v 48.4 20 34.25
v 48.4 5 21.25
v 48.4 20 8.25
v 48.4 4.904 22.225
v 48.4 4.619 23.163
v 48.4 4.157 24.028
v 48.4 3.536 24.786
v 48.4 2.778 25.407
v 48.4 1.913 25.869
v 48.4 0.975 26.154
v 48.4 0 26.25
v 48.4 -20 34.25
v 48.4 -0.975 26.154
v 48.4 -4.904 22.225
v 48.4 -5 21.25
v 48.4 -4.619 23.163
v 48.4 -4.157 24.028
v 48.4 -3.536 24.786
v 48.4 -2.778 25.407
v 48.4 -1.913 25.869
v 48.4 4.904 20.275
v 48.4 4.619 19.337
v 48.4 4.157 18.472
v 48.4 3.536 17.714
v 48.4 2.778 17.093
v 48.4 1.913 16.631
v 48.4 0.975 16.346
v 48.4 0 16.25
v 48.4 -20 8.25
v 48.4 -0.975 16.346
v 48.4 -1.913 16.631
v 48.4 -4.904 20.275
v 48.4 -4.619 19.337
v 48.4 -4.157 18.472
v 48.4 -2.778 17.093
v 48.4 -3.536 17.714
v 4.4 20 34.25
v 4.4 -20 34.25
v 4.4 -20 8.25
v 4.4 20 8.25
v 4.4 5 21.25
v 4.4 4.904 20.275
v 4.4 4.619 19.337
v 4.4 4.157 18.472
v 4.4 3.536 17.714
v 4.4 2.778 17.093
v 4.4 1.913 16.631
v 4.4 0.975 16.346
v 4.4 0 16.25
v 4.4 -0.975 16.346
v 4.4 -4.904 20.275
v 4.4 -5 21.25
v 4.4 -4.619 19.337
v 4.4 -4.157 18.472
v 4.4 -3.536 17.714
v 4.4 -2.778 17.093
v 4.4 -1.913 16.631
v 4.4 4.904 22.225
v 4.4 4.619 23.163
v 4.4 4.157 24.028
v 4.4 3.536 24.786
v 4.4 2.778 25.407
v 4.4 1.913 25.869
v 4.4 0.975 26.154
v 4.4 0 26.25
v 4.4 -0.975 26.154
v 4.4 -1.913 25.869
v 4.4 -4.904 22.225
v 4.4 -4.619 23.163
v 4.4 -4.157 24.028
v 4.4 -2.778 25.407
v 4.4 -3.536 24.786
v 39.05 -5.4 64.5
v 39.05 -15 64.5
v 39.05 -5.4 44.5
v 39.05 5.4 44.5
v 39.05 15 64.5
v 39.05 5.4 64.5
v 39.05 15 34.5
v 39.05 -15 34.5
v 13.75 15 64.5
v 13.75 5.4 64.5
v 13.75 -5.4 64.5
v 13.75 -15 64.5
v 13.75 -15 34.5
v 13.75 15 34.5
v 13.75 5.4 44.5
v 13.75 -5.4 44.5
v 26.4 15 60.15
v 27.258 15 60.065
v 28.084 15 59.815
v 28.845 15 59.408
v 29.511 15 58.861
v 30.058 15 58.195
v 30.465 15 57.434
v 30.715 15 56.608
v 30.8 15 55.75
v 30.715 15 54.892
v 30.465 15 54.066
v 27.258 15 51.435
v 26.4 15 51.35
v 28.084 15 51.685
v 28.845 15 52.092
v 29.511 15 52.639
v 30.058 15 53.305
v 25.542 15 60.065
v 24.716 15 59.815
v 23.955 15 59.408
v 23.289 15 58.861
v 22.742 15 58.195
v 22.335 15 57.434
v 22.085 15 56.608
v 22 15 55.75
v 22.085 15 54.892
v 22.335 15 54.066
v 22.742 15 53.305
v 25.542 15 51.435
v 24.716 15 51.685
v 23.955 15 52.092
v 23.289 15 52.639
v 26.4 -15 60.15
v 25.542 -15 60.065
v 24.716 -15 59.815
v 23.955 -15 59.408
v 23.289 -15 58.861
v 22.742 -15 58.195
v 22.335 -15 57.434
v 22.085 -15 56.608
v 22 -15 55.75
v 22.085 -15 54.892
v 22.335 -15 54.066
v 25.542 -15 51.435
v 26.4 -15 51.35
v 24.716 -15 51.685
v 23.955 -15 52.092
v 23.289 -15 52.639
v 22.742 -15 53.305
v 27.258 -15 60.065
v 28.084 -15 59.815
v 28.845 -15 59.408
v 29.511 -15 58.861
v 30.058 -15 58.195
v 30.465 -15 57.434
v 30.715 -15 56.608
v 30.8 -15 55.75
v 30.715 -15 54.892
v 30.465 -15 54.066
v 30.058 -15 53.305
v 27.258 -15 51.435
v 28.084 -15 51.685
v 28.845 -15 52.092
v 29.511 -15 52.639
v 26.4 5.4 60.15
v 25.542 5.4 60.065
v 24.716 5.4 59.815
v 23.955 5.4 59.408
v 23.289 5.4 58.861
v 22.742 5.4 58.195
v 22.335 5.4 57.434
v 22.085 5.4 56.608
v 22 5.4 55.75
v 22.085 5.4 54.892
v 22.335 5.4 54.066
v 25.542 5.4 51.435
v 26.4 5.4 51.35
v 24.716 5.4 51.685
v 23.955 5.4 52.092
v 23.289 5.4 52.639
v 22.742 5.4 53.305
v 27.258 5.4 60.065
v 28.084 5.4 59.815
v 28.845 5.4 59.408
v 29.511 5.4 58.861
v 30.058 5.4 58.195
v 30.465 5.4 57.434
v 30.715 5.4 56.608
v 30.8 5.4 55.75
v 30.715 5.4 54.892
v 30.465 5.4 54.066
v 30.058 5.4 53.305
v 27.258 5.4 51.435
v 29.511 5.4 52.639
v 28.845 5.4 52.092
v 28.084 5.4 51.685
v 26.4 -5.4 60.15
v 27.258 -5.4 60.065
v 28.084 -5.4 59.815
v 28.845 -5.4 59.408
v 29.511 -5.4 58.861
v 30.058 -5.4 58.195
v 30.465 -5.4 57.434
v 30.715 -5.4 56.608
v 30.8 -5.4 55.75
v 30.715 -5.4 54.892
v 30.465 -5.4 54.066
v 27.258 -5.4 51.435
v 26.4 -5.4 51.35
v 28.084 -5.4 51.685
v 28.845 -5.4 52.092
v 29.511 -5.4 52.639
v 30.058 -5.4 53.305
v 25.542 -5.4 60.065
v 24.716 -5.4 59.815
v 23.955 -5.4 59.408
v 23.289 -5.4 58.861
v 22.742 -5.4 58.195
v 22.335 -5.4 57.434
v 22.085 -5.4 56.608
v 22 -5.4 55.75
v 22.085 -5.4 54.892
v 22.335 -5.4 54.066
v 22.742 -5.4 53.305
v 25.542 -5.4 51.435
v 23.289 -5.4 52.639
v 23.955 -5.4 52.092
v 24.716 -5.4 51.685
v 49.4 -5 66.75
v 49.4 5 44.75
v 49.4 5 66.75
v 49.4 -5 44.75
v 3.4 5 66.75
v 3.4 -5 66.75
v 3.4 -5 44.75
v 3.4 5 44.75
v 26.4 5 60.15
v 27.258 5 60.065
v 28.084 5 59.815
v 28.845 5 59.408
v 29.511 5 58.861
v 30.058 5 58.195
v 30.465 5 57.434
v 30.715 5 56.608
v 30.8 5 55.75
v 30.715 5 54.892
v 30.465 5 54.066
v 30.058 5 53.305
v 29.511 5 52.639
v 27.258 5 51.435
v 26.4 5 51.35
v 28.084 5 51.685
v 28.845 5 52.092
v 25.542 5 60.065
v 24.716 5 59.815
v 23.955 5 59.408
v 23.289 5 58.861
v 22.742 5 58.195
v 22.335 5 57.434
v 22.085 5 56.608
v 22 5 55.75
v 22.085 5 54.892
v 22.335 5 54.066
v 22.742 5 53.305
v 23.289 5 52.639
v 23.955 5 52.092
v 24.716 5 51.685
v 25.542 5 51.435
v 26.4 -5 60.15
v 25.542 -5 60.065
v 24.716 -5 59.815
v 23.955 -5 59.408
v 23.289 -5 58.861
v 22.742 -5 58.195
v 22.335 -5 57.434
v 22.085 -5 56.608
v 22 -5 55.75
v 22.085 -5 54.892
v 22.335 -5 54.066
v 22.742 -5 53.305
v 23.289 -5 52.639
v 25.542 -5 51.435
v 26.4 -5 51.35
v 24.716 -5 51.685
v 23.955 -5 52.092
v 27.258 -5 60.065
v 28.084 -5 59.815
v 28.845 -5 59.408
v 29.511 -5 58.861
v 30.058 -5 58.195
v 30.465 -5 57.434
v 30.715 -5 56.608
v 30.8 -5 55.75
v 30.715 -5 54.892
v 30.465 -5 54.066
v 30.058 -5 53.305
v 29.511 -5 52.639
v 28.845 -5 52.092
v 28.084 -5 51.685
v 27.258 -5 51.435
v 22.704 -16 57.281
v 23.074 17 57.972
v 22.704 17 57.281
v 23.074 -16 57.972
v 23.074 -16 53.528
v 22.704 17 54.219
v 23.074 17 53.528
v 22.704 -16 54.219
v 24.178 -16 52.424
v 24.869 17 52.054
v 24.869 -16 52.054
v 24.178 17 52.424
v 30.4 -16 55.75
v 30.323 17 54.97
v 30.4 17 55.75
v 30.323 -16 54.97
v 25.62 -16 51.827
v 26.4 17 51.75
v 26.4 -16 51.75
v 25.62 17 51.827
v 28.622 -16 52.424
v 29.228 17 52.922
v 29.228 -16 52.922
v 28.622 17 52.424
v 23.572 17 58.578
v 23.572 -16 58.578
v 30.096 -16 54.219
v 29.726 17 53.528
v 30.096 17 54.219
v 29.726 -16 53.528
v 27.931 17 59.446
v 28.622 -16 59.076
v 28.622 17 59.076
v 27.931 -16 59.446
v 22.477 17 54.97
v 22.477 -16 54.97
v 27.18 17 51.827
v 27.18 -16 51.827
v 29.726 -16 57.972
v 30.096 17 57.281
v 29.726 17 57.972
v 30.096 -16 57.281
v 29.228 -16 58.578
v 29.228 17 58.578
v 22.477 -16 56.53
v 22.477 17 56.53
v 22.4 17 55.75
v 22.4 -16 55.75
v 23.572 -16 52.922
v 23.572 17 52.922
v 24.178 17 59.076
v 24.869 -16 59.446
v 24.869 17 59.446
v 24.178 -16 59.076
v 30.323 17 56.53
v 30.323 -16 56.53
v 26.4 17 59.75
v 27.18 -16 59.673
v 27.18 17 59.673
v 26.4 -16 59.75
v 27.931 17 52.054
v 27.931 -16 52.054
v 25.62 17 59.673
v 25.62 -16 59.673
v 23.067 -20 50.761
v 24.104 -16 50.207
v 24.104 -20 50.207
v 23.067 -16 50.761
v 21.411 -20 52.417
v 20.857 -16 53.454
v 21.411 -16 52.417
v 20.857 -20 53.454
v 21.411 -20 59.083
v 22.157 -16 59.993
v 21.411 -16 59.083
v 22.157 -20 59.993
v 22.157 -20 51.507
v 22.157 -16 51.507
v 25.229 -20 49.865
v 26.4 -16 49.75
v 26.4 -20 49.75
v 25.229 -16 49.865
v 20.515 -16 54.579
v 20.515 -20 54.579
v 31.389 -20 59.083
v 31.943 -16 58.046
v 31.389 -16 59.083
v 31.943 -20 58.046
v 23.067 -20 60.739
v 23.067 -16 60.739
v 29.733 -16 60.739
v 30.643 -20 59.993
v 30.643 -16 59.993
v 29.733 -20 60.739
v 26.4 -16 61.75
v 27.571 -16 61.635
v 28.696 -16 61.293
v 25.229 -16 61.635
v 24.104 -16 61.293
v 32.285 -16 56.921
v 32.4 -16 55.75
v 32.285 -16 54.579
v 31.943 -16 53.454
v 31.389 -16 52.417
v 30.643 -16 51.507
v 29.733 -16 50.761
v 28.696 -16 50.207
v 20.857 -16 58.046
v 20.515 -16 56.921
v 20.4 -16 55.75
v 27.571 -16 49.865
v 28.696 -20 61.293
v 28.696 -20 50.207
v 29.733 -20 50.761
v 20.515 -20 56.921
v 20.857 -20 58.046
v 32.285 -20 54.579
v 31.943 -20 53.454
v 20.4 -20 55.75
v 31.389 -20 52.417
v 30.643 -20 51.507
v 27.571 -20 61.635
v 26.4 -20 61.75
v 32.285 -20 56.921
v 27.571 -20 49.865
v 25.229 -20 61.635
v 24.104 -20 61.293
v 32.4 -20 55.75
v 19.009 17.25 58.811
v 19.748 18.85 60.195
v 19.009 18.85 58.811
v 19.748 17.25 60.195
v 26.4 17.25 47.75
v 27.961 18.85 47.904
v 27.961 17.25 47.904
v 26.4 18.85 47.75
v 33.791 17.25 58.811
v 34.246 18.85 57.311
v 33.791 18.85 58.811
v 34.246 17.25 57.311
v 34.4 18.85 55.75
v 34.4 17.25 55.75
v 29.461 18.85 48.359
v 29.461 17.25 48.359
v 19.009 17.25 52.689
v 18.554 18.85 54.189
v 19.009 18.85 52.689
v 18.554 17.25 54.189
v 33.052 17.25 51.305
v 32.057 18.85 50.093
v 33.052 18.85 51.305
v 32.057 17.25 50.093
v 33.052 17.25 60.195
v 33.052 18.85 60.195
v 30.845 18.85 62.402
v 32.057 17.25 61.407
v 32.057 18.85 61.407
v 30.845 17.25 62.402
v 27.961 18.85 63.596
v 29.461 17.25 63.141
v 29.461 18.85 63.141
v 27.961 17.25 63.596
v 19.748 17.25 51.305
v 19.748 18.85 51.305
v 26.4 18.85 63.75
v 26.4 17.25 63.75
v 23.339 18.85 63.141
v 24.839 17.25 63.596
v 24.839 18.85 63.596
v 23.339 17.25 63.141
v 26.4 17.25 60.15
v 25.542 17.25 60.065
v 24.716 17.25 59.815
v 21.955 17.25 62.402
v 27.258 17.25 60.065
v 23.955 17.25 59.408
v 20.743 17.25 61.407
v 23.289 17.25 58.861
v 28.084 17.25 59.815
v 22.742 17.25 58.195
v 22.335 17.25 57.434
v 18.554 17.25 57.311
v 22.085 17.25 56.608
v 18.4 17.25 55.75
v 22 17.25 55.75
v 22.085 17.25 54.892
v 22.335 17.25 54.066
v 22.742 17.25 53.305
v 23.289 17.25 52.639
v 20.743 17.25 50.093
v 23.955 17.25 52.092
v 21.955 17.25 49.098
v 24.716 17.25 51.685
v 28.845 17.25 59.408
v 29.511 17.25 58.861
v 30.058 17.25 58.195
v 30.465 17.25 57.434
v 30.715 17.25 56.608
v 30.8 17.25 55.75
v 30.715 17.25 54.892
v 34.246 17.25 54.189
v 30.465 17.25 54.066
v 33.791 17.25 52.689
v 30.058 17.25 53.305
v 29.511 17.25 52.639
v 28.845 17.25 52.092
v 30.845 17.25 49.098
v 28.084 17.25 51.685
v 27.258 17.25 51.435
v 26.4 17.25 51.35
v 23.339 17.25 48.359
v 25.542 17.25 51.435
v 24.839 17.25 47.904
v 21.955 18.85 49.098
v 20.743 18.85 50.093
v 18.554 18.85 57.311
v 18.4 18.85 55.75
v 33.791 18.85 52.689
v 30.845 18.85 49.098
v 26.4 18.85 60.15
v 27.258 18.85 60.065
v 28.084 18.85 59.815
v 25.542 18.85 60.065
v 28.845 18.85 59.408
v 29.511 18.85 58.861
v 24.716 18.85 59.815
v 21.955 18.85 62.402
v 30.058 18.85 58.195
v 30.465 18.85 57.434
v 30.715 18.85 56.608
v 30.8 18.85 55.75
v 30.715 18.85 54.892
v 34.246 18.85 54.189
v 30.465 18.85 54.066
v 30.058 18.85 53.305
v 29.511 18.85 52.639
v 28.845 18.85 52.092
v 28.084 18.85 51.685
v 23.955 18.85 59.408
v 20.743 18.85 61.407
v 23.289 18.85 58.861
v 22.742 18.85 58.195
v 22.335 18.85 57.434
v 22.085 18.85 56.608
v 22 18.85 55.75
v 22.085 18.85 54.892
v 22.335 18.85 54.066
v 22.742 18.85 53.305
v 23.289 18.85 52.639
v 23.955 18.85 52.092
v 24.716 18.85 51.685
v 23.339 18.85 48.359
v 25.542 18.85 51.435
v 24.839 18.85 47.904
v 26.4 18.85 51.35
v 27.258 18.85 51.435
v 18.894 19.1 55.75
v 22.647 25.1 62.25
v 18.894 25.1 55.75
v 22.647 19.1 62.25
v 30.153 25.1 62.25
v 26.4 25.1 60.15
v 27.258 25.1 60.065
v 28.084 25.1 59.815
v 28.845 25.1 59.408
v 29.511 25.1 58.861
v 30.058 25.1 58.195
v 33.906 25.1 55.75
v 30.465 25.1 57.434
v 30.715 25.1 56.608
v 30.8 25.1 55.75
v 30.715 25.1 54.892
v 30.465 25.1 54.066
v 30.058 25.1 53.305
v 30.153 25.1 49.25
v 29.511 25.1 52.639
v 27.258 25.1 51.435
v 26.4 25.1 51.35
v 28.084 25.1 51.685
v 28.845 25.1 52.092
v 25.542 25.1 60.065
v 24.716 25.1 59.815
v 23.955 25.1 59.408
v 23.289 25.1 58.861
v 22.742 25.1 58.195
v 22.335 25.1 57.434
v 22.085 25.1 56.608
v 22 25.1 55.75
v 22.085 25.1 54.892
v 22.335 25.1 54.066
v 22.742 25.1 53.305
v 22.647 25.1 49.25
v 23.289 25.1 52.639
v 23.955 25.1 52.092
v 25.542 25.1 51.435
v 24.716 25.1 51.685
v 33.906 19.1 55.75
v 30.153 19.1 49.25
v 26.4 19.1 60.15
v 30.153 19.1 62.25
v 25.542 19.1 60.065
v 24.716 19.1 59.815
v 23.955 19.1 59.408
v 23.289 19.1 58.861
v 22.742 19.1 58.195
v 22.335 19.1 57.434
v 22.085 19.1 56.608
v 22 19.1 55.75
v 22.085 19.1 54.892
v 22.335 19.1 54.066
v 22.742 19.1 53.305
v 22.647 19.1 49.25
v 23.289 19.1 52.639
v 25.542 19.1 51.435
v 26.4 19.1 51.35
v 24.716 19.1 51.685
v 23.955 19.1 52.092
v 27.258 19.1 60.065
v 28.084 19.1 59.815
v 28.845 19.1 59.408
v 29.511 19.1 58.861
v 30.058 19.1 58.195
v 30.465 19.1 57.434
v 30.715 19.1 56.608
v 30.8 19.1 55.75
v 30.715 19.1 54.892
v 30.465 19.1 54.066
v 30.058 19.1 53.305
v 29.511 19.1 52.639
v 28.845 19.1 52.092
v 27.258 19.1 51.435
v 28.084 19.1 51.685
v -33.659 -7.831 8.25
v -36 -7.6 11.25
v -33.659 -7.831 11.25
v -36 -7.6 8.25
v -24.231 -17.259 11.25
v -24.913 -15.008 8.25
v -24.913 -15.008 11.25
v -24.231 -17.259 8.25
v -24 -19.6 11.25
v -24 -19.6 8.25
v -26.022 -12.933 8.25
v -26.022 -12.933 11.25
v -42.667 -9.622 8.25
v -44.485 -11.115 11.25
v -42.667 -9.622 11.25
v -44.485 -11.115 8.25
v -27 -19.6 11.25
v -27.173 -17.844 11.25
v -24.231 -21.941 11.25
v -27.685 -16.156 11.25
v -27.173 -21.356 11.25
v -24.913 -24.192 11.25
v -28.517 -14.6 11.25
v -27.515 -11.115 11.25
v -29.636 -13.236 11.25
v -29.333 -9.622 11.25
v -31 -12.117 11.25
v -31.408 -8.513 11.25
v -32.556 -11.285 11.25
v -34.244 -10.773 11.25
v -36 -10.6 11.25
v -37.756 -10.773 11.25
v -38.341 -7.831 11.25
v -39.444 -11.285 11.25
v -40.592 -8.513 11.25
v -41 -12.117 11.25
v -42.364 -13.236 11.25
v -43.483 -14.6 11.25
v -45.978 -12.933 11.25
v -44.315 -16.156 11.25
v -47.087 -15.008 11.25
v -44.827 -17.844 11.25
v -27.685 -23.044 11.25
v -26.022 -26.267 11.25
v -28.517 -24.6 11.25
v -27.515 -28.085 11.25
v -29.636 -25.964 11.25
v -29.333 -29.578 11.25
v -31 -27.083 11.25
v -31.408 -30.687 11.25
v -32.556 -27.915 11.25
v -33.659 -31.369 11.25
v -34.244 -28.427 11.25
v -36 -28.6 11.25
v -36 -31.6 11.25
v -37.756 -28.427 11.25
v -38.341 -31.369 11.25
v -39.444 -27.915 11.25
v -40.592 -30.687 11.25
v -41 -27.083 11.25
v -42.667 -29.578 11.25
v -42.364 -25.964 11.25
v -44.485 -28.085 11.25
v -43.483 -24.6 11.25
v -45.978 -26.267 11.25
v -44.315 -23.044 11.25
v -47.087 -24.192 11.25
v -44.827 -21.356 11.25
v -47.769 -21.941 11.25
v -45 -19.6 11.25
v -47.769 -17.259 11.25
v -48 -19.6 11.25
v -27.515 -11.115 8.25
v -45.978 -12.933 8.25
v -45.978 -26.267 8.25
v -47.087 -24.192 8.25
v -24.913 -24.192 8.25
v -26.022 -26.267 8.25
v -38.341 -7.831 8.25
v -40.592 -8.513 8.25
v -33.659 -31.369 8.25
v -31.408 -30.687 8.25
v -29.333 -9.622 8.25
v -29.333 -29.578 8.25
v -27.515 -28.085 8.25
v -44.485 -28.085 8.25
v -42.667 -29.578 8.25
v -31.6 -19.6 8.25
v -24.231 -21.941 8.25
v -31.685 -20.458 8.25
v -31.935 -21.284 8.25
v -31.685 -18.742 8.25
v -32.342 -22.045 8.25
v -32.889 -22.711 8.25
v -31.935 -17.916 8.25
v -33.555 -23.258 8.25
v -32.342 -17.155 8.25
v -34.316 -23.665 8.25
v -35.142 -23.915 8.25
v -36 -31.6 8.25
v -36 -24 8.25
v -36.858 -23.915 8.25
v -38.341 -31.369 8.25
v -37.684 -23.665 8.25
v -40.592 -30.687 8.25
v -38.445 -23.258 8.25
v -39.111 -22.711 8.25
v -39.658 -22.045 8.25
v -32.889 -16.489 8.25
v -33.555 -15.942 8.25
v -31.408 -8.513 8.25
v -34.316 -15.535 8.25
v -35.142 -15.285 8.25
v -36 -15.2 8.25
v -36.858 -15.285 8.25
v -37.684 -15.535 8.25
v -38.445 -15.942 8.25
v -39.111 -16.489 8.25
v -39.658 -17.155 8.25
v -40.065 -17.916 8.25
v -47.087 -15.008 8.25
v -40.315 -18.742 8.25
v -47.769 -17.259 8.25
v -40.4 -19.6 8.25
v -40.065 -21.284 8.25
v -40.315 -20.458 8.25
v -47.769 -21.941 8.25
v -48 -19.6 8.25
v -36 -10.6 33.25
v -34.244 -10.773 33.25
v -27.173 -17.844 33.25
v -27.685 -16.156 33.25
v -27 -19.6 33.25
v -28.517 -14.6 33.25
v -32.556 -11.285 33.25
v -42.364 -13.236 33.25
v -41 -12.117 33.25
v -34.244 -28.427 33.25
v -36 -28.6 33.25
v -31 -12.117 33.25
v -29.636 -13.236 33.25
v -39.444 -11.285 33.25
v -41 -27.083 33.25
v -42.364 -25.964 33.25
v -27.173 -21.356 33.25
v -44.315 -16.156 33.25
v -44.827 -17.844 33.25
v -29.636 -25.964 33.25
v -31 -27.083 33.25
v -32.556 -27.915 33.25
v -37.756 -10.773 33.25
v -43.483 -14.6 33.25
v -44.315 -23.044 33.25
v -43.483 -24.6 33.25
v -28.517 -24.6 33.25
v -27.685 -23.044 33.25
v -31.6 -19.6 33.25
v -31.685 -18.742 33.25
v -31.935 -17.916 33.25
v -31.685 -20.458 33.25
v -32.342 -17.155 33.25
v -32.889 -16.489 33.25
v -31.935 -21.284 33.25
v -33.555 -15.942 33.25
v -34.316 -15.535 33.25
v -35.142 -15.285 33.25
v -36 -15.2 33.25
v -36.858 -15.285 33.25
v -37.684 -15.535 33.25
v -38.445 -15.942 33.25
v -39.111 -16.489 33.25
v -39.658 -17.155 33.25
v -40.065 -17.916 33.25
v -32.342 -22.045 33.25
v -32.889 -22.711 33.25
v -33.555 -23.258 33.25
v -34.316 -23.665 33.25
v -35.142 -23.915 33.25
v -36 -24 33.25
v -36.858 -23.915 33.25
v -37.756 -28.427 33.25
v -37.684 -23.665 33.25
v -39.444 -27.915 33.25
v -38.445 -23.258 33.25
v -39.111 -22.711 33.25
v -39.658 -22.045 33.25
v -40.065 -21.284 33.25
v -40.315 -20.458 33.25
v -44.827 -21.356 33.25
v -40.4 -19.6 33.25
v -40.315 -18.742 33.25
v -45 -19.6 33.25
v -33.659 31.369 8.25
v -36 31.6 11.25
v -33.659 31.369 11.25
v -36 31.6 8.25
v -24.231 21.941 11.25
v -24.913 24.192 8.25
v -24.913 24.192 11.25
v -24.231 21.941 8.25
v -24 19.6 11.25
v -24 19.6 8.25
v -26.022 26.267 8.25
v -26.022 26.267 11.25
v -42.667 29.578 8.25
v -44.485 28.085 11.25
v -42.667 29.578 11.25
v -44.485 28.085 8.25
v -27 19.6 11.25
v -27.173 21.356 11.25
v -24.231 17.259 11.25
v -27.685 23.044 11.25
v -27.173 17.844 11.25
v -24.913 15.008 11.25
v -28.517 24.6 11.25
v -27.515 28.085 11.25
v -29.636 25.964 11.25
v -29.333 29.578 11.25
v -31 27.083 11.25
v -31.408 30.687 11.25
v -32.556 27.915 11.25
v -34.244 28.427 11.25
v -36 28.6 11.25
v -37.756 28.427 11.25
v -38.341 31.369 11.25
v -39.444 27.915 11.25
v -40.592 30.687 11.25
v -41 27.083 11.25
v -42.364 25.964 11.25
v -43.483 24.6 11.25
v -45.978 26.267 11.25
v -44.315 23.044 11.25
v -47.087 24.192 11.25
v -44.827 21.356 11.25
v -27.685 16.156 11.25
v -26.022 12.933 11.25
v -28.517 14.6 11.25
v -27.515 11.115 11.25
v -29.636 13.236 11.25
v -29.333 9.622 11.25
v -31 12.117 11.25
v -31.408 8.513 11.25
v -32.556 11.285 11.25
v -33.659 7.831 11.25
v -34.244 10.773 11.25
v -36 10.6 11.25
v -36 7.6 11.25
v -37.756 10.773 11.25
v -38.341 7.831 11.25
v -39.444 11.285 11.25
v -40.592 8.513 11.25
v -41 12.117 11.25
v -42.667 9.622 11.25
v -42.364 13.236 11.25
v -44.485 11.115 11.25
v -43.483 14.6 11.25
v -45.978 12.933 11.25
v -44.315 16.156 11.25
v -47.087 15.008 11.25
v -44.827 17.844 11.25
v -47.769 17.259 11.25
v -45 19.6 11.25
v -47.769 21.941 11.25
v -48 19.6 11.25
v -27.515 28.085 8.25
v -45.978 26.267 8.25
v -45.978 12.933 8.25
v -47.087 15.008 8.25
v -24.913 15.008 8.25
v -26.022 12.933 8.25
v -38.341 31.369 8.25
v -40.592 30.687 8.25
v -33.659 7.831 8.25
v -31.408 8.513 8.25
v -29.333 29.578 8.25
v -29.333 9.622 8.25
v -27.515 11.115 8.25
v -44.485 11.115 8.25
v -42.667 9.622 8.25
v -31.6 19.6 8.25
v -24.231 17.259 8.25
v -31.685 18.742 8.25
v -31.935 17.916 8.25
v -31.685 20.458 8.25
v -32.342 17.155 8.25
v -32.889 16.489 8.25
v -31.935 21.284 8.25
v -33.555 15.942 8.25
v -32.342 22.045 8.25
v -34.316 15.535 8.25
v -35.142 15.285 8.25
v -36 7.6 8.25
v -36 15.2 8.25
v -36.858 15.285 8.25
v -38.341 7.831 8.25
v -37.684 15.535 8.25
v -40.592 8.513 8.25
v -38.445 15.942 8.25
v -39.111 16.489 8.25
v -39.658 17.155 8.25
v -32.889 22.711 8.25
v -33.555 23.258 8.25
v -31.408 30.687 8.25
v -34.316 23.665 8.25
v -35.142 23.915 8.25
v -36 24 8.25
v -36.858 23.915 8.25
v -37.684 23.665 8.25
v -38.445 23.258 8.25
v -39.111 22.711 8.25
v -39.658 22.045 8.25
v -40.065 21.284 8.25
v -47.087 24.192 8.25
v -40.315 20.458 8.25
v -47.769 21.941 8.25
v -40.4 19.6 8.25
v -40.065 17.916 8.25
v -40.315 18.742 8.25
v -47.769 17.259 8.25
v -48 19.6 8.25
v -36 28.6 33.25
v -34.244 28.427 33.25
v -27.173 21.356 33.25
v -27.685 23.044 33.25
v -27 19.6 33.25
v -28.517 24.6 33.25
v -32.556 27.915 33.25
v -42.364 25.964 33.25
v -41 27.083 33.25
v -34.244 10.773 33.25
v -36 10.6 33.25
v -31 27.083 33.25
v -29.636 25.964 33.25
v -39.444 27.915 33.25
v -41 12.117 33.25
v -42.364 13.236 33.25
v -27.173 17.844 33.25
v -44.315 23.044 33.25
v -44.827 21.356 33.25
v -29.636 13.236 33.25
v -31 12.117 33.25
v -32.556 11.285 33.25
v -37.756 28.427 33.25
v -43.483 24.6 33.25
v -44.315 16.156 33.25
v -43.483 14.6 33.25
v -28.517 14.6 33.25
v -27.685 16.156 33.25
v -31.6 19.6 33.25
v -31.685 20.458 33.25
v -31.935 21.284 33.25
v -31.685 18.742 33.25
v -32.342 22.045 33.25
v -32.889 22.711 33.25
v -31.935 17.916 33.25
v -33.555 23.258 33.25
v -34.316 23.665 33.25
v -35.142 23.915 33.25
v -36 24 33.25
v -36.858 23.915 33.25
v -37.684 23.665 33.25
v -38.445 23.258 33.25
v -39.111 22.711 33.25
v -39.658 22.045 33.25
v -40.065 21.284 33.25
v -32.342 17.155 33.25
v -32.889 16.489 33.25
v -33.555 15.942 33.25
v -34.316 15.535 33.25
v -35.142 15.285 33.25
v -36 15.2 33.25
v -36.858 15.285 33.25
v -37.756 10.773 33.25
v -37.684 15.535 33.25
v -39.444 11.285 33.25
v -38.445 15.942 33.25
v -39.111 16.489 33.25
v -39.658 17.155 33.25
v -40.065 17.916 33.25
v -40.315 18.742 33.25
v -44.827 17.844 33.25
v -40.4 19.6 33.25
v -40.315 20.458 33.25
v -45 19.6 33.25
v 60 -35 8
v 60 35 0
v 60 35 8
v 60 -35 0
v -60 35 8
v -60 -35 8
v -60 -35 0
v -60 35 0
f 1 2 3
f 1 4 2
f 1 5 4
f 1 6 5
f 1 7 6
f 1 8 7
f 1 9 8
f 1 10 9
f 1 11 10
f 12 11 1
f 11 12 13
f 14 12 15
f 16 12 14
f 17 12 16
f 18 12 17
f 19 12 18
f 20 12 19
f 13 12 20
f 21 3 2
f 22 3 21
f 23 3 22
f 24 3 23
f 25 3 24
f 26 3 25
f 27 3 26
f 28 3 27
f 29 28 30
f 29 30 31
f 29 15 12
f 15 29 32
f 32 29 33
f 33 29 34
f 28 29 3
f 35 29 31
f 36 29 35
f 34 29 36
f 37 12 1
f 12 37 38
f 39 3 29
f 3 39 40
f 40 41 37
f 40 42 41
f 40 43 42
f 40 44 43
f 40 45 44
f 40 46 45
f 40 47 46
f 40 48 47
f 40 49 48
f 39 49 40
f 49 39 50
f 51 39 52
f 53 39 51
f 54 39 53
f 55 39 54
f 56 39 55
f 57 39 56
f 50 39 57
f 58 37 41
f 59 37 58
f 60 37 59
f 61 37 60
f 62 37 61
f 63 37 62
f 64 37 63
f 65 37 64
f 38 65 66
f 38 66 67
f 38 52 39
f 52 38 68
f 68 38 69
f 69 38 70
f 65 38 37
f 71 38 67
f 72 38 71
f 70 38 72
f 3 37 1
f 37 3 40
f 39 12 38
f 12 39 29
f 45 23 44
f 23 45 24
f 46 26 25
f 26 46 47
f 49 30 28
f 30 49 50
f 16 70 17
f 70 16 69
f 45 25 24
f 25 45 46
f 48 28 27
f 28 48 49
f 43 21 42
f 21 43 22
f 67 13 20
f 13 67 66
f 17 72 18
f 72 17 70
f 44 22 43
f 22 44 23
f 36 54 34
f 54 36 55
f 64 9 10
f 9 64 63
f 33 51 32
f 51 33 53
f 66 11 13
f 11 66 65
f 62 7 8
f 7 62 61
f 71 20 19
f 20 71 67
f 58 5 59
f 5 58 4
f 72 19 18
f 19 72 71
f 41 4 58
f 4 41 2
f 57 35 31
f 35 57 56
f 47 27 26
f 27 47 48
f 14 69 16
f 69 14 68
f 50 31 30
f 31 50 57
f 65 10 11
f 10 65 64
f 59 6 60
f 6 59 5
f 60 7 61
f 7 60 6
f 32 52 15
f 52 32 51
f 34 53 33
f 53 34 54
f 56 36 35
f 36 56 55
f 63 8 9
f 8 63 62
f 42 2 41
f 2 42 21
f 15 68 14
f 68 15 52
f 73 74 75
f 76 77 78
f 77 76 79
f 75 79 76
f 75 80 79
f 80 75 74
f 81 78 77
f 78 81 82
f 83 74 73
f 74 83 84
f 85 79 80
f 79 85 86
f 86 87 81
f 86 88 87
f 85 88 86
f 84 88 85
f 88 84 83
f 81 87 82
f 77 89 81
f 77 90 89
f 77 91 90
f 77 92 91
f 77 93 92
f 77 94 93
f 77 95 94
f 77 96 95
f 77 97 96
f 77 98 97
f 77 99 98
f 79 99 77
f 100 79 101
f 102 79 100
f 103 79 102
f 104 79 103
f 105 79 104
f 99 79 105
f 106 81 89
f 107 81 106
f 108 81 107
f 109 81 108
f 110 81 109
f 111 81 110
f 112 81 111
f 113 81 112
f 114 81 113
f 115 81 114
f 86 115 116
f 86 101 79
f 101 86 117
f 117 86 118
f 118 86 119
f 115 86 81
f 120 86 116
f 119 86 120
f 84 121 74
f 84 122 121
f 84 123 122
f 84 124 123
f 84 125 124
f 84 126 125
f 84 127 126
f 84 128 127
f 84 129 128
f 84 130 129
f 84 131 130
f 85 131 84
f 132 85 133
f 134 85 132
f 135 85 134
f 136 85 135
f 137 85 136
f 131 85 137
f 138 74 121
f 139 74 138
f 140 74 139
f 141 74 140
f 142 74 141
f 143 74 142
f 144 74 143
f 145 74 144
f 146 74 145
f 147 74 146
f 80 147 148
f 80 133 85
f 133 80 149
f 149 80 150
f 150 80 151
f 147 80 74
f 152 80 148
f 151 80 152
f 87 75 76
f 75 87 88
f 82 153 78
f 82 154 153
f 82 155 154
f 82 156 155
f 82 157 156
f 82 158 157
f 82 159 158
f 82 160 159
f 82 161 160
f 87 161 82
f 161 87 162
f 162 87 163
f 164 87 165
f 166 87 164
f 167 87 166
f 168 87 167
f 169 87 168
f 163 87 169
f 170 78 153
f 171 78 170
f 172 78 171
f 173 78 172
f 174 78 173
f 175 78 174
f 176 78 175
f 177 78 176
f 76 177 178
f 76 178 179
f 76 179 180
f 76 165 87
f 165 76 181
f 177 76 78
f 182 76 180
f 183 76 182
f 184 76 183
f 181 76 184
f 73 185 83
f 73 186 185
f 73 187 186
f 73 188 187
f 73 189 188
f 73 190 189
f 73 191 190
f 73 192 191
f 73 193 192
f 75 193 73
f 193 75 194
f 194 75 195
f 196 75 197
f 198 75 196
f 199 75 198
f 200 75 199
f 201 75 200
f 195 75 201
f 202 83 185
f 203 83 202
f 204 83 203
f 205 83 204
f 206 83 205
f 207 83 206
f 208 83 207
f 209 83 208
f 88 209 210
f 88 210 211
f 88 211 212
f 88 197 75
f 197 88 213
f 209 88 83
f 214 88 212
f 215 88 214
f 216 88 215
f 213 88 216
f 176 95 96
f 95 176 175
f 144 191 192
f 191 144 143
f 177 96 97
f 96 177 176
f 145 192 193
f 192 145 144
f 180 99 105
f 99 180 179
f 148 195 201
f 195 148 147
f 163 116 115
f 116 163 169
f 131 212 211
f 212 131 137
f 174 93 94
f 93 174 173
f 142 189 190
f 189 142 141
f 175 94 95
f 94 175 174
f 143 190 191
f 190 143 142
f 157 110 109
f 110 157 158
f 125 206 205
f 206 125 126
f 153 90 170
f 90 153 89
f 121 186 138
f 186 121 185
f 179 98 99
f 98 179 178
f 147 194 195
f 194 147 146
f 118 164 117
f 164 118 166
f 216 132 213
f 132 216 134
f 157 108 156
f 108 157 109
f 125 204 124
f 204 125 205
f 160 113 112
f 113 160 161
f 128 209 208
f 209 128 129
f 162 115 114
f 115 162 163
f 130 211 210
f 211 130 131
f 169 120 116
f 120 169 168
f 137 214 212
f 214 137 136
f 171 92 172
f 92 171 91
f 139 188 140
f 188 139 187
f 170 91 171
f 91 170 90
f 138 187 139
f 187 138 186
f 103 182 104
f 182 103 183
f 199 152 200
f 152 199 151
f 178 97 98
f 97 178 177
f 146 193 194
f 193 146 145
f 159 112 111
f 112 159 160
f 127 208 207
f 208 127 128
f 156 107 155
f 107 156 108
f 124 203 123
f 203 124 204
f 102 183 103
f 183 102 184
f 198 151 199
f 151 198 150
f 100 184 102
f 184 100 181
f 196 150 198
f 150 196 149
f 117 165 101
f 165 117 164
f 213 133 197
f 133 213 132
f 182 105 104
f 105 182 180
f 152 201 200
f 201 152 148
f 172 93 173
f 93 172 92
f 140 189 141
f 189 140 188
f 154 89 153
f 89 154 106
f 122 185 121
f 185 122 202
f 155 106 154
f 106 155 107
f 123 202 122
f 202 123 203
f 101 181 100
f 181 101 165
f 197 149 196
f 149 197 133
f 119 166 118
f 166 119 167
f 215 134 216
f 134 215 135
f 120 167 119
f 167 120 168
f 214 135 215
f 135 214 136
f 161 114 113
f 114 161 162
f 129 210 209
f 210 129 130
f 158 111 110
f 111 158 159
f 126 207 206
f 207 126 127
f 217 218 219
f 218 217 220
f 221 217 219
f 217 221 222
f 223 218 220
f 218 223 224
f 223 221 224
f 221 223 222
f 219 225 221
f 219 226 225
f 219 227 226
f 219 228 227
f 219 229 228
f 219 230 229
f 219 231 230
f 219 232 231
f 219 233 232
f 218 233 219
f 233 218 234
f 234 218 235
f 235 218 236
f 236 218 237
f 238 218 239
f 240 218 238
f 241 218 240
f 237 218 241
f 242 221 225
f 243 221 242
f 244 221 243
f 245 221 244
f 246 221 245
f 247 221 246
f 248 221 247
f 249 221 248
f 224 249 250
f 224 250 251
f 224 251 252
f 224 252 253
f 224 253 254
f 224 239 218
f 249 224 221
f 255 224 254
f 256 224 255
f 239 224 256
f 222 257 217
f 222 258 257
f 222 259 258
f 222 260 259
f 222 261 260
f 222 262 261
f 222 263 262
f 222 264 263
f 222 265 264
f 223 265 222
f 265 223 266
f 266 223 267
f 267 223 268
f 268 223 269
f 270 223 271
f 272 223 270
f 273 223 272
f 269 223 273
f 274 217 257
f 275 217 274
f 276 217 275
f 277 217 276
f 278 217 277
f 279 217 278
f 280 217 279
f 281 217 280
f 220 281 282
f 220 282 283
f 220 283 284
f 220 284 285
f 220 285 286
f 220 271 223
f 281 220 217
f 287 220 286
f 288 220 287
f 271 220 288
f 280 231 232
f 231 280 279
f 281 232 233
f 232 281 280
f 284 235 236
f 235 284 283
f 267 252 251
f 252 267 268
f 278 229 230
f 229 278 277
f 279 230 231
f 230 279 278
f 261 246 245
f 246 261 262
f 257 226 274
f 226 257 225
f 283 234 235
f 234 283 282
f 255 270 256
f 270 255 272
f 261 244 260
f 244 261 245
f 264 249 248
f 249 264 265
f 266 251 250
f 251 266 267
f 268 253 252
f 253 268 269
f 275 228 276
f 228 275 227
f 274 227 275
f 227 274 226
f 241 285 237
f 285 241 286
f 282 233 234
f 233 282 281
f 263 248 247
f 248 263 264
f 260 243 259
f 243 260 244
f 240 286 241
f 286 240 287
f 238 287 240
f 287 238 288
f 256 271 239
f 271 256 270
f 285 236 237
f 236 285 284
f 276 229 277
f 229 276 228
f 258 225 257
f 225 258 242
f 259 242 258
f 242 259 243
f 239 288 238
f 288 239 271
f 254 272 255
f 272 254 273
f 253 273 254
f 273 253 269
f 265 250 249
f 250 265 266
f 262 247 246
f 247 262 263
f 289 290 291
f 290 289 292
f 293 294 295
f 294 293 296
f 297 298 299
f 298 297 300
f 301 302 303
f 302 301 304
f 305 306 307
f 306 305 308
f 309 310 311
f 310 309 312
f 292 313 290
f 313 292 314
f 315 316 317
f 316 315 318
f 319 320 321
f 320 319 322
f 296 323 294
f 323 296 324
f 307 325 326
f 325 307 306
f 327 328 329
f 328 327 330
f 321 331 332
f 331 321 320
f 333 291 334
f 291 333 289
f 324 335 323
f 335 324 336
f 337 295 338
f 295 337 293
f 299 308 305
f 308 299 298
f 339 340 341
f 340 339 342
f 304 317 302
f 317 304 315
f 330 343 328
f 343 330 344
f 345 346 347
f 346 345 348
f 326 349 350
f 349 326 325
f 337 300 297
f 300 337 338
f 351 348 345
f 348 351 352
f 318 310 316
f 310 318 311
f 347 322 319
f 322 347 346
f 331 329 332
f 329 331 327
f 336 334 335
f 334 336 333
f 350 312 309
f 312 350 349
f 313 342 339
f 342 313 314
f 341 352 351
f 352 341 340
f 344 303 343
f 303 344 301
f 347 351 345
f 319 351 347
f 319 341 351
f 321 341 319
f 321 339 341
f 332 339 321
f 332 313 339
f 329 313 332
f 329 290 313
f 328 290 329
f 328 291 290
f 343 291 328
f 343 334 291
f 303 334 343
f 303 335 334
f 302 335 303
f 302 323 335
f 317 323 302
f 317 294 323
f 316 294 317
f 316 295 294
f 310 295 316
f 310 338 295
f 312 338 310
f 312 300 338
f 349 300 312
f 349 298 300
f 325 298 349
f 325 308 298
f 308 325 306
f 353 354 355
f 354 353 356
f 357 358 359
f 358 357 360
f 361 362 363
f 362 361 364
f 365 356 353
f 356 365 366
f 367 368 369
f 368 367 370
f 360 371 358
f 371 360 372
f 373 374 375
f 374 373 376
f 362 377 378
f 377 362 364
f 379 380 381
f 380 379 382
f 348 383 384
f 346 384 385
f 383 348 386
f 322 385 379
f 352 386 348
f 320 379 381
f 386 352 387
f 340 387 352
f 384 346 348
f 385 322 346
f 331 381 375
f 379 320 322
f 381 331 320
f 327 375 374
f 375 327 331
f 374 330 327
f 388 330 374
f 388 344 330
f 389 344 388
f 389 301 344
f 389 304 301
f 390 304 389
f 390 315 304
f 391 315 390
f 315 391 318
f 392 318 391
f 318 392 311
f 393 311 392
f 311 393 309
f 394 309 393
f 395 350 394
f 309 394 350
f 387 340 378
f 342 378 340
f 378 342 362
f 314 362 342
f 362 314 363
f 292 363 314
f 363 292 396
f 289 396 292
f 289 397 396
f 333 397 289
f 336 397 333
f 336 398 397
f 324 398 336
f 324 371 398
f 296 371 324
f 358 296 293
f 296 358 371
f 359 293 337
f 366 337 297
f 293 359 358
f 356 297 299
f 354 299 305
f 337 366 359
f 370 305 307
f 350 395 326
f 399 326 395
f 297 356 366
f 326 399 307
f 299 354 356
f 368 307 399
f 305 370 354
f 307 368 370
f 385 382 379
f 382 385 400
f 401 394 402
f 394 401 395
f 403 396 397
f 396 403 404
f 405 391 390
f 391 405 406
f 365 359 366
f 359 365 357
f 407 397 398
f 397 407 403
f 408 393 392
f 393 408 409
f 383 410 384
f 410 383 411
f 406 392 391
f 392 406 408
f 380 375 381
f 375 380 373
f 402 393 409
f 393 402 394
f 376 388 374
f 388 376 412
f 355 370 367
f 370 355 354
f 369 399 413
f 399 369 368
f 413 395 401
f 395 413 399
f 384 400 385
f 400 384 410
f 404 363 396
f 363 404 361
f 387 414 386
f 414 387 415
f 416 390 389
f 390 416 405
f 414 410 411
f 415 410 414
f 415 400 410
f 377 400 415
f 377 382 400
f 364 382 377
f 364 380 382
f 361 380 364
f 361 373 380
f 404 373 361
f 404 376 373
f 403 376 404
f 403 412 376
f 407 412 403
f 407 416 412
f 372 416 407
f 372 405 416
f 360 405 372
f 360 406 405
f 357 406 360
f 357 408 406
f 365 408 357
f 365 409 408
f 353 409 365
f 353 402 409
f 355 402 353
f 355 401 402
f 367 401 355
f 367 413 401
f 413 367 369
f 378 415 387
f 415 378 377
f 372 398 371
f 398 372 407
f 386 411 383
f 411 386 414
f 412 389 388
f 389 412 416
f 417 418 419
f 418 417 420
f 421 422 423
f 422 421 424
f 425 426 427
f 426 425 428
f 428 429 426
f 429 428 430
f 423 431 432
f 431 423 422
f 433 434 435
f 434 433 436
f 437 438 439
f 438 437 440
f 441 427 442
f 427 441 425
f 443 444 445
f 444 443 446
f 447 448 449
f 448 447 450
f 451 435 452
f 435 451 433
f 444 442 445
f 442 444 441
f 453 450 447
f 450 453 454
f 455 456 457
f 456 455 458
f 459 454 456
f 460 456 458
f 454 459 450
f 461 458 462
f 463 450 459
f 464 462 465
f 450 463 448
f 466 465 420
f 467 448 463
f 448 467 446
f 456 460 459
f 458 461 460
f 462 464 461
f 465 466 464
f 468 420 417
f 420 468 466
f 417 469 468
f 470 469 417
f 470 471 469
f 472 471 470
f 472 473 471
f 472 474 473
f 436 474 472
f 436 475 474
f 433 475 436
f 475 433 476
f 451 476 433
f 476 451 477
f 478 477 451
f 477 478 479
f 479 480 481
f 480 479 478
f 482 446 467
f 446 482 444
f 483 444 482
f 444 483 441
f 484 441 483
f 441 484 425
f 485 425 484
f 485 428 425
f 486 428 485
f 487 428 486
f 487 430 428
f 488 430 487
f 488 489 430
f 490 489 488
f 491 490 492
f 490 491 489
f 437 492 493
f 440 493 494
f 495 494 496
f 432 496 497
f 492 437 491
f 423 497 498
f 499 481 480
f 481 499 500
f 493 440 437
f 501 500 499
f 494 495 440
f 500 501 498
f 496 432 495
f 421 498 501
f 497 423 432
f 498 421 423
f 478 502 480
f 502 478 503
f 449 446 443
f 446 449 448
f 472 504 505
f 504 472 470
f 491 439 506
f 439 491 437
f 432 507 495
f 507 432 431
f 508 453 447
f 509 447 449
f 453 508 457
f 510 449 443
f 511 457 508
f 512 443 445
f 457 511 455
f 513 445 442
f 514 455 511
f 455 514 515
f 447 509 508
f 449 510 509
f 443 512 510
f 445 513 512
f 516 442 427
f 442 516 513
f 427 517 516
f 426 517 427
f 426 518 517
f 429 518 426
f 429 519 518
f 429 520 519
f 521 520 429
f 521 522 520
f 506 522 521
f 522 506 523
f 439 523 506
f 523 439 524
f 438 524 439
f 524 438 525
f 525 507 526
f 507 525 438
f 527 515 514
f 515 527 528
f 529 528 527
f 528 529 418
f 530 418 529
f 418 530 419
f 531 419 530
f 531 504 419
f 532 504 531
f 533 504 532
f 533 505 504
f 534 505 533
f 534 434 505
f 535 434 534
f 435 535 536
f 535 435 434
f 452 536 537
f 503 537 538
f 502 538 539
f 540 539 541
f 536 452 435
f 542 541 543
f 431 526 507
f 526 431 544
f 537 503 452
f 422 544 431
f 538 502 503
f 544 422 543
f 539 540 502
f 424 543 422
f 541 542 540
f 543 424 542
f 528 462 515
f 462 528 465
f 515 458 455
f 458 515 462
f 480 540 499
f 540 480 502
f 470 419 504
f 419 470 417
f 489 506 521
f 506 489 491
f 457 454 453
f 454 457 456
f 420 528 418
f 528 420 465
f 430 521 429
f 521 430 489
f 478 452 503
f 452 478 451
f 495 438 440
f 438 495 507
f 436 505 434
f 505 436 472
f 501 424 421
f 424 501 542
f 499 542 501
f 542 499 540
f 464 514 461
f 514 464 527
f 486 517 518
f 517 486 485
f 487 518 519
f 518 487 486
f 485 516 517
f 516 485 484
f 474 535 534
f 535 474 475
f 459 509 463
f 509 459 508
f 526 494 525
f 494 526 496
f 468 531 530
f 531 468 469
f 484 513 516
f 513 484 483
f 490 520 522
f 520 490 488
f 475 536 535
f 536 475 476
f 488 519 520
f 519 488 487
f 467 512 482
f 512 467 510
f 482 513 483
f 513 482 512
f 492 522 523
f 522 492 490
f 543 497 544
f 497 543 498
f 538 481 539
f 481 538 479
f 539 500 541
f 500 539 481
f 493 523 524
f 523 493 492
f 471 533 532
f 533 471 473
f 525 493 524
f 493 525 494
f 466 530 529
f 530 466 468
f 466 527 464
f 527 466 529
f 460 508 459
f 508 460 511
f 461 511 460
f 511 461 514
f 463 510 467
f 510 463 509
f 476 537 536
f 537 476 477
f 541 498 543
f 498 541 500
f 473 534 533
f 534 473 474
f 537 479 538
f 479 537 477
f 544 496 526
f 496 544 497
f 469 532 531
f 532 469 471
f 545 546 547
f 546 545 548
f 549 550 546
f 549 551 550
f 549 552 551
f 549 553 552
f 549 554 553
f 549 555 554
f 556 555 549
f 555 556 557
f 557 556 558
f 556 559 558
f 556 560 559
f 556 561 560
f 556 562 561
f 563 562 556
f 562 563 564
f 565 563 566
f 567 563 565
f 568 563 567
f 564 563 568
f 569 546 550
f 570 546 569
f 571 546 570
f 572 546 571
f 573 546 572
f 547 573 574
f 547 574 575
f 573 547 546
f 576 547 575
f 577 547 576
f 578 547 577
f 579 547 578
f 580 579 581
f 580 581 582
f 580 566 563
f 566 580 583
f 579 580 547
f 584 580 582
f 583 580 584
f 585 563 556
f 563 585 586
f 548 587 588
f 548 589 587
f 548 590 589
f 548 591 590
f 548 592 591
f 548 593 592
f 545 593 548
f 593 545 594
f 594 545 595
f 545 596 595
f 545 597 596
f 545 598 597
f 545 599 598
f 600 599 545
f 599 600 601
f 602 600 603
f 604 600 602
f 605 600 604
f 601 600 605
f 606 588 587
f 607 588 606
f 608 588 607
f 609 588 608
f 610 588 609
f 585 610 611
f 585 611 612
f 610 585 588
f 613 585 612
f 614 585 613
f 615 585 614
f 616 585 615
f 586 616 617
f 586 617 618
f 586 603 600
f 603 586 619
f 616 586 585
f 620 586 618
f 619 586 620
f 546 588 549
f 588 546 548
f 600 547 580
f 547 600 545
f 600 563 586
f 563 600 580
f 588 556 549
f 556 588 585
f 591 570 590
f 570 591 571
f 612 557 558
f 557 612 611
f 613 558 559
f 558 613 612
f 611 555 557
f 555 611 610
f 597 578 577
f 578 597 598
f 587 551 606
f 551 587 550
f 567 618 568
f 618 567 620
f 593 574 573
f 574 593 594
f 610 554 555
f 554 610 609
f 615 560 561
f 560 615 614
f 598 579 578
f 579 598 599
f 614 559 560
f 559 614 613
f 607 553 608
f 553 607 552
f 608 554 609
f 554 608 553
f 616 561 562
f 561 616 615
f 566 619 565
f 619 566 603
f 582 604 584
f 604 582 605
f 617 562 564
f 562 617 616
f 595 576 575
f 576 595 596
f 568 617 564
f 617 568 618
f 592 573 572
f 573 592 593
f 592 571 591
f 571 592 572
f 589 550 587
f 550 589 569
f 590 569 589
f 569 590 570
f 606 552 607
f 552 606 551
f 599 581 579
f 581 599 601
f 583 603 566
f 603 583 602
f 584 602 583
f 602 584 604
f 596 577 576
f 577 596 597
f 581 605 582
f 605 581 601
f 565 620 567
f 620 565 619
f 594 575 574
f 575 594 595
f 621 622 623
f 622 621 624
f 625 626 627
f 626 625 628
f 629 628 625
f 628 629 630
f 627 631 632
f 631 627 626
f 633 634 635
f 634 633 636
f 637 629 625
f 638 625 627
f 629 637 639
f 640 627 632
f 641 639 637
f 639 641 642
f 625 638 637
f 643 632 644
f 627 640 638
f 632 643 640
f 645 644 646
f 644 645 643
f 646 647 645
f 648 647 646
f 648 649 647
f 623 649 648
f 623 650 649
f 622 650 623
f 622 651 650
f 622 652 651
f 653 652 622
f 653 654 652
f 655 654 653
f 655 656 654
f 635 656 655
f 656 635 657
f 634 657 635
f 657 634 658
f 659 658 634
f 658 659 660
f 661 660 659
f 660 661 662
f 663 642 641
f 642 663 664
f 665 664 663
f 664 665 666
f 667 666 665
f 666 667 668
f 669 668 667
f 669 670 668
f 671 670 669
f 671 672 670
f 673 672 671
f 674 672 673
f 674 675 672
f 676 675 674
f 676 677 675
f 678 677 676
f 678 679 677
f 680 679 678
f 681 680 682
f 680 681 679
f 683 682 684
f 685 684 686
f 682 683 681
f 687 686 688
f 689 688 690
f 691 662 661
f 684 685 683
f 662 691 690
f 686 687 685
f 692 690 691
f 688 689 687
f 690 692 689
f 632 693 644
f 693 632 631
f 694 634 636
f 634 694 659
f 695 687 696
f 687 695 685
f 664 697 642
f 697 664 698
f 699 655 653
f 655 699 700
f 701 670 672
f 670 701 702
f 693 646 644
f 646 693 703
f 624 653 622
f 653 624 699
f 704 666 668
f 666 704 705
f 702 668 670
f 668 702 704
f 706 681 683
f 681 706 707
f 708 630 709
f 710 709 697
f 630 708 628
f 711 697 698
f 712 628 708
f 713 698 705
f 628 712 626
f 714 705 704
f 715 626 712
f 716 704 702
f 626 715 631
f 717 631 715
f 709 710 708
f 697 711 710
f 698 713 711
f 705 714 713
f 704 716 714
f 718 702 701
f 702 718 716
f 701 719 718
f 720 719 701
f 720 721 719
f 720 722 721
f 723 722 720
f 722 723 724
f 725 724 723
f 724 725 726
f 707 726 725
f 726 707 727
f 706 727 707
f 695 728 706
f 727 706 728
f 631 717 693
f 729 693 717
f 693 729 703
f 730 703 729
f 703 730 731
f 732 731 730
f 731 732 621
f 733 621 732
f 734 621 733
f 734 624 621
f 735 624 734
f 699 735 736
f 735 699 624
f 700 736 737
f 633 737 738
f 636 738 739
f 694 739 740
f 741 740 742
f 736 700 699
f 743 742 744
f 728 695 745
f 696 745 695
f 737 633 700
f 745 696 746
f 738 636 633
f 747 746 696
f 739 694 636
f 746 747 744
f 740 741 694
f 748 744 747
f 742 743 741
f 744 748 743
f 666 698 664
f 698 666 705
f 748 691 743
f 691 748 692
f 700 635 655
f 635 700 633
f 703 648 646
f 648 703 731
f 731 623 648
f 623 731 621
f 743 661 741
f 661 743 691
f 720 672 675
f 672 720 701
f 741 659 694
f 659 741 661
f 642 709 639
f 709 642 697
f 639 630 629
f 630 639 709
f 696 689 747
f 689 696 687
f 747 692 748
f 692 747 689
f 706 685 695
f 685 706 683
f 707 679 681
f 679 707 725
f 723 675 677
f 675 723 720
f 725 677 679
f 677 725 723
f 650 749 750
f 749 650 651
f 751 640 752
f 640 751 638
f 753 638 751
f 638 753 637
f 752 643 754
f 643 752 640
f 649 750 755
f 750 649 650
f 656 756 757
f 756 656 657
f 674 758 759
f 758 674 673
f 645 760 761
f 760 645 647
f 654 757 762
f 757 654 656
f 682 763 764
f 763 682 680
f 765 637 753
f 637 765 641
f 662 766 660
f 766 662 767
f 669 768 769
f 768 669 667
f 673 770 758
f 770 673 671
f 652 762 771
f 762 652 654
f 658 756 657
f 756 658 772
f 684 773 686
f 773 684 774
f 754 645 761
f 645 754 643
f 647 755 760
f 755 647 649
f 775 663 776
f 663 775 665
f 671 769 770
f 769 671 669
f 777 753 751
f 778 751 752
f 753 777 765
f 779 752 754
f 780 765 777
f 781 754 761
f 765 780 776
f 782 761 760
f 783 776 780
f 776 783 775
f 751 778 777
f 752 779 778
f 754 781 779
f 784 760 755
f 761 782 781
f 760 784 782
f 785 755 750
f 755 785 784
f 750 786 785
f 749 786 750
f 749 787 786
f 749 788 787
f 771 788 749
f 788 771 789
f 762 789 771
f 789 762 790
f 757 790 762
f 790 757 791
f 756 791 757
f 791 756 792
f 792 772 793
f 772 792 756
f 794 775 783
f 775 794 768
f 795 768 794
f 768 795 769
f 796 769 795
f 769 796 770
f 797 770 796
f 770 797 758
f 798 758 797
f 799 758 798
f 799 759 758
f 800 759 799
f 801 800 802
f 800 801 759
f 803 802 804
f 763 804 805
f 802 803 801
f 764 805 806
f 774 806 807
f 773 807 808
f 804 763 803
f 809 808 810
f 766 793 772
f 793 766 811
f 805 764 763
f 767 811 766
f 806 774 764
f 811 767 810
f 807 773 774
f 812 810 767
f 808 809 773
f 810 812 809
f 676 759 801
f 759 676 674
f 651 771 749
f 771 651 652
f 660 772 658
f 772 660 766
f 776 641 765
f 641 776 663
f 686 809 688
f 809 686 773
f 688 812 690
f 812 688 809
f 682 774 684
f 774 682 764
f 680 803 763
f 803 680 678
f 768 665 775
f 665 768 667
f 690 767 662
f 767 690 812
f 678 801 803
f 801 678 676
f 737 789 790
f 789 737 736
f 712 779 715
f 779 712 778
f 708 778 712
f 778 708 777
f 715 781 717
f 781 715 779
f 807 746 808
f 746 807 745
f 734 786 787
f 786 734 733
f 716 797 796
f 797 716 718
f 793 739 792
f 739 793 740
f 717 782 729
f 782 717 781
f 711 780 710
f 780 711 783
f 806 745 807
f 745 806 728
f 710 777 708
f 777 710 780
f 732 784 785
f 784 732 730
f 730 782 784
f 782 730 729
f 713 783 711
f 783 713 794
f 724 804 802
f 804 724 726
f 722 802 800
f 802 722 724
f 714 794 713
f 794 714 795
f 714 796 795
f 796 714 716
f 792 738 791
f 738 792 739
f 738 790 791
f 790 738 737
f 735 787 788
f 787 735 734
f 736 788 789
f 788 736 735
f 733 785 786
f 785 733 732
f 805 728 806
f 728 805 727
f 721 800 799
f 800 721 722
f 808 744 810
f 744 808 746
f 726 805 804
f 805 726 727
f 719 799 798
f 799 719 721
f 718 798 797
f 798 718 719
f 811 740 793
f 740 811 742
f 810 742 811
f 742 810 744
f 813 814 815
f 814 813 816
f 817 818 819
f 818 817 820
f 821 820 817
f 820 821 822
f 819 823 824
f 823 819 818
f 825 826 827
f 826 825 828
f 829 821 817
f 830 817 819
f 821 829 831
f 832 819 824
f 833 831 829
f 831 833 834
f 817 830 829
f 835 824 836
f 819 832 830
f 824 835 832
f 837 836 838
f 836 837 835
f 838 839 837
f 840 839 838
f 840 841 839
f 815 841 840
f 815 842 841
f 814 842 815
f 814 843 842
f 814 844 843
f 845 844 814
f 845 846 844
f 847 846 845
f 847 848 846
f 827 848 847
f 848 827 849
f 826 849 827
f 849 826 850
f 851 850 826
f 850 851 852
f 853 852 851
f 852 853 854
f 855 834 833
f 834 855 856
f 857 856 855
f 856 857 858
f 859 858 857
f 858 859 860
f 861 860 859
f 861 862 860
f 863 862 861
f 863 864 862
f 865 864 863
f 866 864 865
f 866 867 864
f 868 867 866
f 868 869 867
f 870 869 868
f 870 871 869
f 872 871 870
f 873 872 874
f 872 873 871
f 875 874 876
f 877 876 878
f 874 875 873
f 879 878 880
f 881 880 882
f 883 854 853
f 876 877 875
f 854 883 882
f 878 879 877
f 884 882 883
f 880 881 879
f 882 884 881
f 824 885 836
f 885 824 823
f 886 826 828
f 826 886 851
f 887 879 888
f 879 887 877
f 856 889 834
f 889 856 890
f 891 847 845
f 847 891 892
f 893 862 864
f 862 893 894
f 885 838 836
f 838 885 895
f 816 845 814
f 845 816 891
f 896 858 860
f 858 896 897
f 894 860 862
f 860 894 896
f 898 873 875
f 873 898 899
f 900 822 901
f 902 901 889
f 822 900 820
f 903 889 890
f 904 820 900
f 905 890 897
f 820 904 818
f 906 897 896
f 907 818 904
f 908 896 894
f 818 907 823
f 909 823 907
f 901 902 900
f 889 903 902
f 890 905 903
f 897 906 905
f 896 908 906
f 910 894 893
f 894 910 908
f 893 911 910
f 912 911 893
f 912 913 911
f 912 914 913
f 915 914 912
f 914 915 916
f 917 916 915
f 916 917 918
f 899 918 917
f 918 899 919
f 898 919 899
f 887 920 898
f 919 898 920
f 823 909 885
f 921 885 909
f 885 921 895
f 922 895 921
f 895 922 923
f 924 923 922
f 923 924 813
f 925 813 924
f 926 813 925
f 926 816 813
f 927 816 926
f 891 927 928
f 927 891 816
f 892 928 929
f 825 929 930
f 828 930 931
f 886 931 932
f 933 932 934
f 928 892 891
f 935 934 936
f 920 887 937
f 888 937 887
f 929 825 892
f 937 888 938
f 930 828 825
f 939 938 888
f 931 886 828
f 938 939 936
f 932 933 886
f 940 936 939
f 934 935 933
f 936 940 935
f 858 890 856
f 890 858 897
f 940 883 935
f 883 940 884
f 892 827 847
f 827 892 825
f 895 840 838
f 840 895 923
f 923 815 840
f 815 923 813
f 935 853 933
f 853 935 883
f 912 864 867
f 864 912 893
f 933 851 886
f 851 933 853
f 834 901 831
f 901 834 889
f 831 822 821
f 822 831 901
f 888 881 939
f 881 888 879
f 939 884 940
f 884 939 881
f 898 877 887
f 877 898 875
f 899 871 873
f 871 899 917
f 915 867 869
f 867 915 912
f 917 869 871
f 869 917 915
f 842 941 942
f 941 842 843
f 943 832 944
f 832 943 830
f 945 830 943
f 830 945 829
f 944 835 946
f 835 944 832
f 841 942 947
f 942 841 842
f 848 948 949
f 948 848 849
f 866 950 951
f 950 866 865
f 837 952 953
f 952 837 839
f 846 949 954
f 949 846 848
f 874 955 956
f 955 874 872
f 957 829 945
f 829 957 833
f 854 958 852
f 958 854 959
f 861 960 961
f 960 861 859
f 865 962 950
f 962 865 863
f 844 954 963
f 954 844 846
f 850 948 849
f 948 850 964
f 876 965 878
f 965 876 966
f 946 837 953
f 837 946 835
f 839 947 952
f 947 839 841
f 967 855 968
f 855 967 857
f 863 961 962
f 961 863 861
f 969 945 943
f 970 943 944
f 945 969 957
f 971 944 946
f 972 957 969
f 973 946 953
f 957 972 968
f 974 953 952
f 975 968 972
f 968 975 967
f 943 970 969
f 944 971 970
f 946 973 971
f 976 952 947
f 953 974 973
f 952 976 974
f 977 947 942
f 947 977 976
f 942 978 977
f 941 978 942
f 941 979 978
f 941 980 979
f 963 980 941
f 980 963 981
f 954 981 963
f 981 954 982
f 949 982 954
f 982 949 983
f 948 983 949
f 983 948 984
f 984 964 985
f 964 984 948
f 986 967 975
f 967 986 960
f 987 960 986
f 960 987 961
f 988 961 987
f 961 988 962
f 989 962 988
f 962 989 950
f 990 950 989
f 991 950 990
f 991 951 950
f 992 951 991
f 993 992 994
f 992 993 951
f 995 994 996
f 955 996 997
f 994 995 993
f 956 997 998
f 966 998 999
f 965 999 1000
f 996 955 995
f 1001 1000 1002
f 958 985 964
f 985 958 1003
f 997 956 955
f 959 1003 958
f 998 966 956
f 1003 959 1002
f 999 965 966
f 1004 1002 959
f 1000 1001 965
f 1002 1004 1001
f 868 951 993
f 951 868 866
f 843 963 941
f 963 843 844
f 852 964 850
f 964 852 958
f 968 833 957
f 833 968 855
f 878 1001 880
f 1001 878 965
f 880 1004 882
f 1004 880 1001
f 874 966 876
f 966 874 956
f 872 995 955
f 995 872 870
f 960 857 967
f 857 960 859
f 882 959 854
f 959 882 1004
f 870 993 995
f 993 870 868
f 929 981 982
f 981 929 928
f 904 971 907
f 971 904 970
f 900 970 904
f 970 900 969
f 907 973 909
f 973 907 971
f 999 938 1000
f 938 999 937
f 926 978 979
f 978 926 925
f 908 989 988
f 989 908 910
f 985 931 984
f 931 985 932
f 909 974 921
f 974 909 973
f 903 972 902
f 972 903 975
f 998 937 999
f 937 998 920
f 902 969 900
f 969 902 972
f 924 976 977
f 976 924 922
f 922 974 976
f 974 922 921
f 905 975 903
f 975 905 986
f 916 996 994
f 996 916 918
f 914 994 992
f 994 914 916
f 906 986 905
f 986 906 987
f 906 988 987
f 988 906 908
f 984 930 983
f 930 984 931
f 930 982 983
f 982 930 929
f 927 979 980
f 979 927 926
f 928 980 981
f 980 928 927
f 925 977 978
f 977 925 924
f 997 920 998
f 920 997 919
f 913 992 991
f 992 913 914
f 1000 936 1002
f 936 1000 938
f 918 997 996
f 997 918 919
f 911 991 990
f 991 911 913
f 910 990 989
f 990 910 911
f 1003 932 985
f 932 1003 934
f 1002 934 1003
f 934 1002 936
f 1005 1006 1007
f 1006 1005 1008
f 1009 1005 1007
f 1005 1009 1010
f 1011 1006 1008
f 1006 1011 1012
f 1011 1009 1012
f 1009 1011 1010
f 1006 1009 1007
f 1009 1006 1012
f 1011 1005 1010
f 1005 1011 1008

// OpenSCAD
$fn = 32;

// ------------------------------------------------------------------------
// Indexing jig: plate 120 x 70 mm, pin d8
// Every part is its own module, assembly() places every instance.
// ------------------------------------------------------------------------

// --- part 1 ---
module jig_plate() {
  difference() {
    translate([-60, -35, 0]) cube([120, 70, 8]);
  }
}

// --- part 2 ---
module locator_block() {
  difference() {
    translate([-22, -20, 0]) cube([44, 40, 26]);
    translate([0, 0, 13]) rotate([0, 90, 0]) cylinder(h = 46, d = 10, center = true);
  }
}

// --- part 3 ---
module index_fork() {
  difference() {
    translate([-12.65, -15, 0]) cube([25.3, 30, 30]);
    translate([-13.65, -5.4, 10]) cube([27.3, 10.8, 21]);
    translate([0, 0, 21.25]) rotate([90, 0, 0]) cylinder(h = 32, d = 8.8, center = true);
  }
}

// --- part 4 ---
module index_arm() {
  difference() {
    translate([-23, -5, 0]) cube([46, 10, 22]);
    translate([0, 0, 11]) rotate([90, 0, 0]) cylinder(h = 12, d = 8.8, center = true);
  }
}

// --- part 5 ---
module index_pin() {
  rotate([0, 90, 0]) cylinder(h = 34, d = 8, center = true);
  translate([-20, 0, 0]) rotate([0, 90, 0]) cylinder(h = 4, d = 12);
}

// --- part 6 ---
module pin_washer() {
  difference() {
      translate([0, 0, 0]) cylinder(h = 1.6, d = 16);
      translate([0, 0, -1]) cylinder(h = 3.6, d = 8.8);
    }
}

// --- part 7 ---
module lock_nut() {
  difference() {
    linear_extrude(height = 6) polygon(points = [[7.506, 0], [3.753, 6.5], [-3.753, 6.5], [-7.506, 0], [-3.753, -6.5], [3.753, -6.5]]);
    translate([0, 0, -1]) cylinder(h = 8, d = 8.8);
  }
}

// --- part 8 ---
module guide_bush_a() {
  difference() {
    union() {
      cylinder(h = 3, d = 24);
      translate([0, 0, 3]) cylinder(h = 22, d = 18);
    }
    translate([0, 0, -1]) cylinder(h = 27, d = 8.8);
  }
}

// --- part 9 ---
module guide_bush_b() {
  difference() {
    union() {
      cylinder(h = 3, d = 24);
      translate([0, 0, 3]) cylinder(h = 22, d = 18);
    }
    translate([0, 0, -1]) cylinder(h = 27, d = 8.8);
  }
}

// --- assembly ---
module assembly() {
  color([0.80, 0.24, 0.20]) translate([0, 0, 0]) rotate([0, 0, 0]) jig_plate();
  color([0.20, 0.45, 0.75]) translate([26.4, 0, 8.25]) rotate([0, 0, 0]) locator_block();
  color([0.25, 0.62, 0.32]) translate([26.4, 0, 34.5]) rotate([0, 0, 0]) index_fork();
  color([0.92, 0.70, 0.18]) translate([26.4, 0, 44.75]) rotate([0, 0, 0]) index_arm();
  color([0.58, 0.35, 0.70]) translate([26.4, 0, 55.75]) rotate([0, 0, 90]) index_pin();
  color([0.16, 0.66, 0.66]) translate([26.4, 18.85, 55.75]) rotate([90, 0, 0]) pin_washer();
  color([0.85, 0.48, 0.18]) translate([26.4, 25.1, 55.75]) rotate([90, 0, 0]) lock_nut();
  color([0.55, 0.60, 0.65]) translate([-36, -19.6, 8.25]) rotate([0, 0, 0]) guide_bush_a();
  color([0.75, 0.30, 0.55]) translate([-36, 19.6, 8.25]) rotate([0, 0, 0]) guide_bush_b();
}

assembly();
